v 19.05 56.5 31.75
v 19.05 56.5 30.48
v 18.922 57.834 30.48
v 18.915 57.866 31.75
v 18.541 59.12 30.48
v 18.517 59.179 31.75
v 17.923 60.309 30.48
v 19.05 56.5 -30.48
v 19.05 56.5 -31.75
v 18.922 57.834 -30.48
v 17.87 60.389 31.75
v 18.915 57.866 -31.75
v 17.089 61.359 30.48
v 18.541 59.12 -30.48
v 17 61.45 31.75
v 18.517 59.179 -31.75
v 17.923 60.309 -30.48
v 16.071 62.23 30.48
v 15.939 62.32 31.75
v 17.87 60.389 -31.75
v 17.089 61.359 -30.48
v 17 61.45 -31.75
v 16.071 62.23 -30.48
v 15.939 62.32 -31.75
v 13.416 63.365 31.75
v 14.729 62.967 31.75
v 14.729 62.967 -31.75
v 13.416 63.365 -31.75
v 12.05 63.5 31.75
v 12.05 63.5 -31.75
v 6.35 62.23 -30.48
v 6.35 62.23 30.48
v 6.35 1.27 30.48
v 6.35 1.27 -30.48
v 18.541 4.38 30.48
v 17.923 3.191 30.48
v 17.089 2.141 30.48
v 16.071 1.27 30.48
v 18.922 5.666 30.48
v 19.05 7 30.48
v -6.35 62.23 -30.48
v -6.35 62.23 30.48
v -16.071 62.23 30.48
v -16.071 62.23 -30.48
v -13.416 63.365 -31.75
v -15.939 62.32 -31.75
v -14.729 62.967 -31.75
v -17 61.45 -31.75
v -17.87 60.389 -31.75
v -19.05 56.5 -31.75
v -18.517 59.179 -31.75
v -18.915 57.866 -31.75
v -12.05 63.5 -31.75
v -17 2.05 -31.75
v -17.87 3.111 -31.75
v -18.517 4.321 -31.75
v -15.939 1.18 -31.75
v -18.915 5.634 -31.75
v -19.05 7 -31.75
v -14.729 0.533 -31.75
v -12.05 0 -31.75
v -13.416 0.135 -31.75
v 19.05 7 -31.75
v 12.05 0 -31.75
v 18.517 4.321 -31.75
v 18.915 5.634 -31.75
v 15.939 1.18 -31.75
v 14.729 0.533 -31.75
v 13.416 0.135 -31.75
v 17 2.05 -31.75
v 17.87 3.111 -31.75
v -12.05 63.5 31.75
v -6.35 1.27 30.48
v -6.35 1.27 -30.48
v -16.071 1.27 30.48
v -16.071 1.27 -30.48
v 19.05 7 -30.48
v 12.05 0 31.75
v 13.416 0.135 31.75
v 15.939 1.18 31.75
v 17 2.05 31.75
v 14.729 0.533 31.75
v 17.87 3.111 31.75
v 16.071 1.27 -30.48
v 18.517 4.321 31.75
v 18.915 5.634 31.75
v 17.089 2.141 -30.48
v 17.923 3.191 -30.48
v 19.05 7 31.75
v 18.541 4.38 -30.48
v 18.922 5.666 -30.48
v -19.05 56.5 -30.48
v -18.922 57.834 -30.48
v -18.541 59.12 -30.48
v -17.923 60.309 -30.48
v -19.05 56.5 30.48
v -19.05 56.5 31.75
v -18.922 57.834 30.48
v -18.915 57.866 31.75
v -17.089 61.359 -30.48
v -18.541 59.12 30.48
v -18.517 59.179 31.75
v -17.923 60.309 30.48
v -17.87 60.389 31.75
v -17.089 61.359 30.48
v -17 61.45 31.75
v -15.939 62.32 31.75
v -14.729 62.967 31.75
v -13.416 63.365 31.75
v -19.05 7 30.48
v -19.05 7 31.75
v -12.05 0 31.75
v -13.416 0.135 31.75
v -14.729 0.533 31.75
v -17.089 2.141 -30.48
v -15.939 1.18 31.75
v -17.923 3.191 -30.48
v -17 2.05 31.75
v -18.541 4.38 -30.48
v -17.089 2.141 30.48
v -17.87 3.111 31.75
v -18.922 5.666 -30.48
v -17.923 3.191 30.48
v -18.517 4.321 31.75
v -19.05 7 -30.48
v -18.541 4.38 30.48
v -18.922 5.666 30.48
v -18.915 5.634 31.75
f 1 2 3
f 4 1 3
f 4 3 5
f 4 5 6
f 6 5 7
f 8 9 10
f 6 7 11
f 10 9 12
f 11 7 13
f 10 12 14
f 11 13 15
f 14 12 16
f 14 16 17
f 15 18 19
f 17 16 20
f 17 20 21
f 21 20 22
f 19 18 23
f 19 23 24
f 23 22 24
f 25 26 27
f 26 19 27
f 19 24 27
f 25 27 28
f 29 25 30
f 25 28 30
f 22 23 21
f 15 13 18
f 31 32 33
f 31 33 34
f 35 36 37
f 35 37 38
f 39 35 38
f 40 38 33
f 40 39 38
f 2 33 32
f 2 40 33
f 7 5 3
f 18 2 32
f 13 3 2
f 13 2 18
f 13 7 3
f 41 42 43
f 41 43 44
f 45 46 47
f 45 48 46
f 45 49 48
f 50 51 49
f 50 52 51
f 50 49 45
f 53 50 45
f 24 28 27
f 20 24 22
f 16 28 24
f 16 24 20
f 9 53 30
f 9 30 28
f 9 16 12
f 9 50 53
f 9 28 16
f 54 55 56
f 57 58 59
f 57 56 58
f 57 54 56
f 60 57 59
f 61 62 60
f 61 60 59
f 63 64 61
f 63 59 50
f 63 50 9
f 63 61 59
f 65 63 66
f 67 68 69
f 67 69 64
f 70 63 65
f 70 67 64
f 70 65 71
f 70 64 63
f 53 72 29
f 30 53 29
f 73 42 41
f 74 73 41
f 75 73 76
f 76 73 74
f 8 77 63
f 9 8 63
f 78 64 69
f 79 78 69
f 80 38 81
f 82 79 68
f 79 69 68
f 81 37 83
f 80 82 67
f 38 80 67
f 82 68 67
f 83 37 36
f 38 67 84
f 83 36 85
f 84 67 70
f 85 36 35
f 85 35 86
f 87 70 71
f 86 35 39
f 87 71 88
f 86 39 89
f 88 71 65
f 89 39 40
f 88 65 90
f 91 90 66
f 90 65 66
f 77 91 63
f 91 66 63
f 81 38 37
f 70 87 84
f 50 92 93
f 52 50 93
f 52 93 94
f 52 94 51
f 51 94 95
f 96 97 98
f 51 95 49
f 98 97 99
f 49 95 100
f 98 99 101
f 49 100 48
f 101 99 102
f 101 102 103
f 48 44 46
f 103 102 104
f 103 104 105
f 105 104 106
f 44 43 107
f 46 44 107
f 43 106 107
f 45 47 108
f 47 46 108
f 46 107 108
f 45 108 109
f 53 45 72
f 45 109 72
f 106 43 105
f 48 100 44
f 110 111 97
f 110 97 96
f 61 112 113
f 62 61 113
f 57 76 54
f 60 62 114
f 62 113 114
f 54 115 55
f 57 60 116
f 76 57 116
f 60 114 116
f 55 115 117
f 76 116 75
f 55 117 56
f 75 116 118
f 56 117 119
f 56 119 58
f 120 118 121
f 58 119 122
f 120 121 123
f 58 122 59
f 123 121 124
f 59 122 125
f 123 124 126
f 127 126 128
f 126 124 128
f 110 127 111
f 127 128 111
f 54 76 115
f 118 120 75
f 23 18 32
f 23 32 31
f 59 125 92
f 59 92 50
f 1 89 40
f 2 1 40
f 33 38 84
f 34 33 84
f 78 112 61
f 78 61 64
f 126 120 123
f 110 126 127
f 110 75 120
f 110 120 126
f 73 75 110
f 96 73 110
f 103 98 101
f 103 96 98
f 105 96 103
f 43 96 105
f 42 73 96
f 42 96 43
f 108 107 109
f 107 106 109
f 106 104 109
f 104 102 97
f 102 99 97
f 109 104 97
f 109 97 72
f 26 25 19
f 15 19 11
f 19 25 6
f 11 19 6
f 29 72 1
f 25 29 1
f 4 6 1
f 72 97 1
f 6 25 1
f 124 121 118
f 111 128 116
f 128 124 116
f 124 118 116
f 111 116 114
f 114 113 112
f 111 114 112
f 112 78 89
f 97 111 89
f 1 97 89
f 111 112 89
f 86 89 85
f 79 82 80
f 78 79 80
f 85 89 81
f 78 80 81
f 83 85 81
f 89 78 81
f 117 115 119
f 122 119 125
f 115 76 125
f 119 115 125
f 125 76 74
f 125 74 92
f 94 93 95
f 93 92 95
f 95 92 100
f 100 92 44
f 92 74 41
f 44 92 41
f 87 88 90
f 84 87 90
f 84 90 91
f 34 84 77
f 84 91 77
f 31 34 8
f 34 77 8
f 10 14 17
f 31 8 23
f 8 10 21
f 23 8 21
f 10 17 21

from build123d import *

# Parameters (mm, degrees)
SKETCH1_W           = 38.1
SKETCH1_H           = 63.5
BOSS_EXTRUDE1_DEPTH = 63.5
SKETCH2_W           = 60.96
SKETCH2_H           = 60.96
CUT_EXTRUDE1_DEPTH  = 12.7
LPATTERN1_COUNT     = 2
LPATTERN1_PITCH     = 25.4
FILLET1_R           = 7
FILLET2_R           = 7


with BuildPart() as part:
    # Sketch1 → Boss-Extrude1 (new body)
    with BuildSketch(Plane(origin=(0, 0, 0), x_dir=(1, 0, 0), z_dir=(0, 1, 0))):
        Rectangle(SKETCH1_W, SKETCH1_H)
    extrude(amount=BOSS_EXTRUDE1_DEPTH)

    # Sketch2 → Cut-Extrude1 (cut)
    with BuildSketch(Plane(origin=(19.05, 0, 0), x_dir=(0, 0, -1), z_dir=(1, 0, 0))):
        with Locations((0, 31.75)):
            Rectangle(SKETCH2_W, SKETCH2_H)
    cut_extrude1 = extrude(amount=-CUT_EXTRUDE1_DEPTH, mode=Mode.SUBTRACT)

    # LPattern1: Cut-Extrude1 ×2
    with Locations(*[(-i * LPATTERN1_PITCH, 0, 0) for i in range(1, LPATTERN1_COUNT)]):
        add(cut_extrude1, mode=Mode.SUBTRACT)

    # Fillet1
    # the kernel refuses this fillet: 7 mm, written as the material it takes off along each edge
    with BuildSketch(Plane(origin=(19.05, 63.5, -49.25), x_dir=(0, -1, 0), z_dir=(0, 0, 1)), Plane(origin=(-19.05, 63.5, 49.25), x_dir=(0, -1, 0), z_dir=(0, 0, -1))) as fillet1_piece_1:
        with BuildLine():
            CenterArc((FILLET1_R, -FILLET1_R), FILLET1_R, 90, 90)
            Line((0, -FILLET1_R), (0, 0))
            Line((0, 0), (FILLET1_R, 0))
        make_face()
    extrude(amount=98.5, mode=Mode.SUBTRACT)

    # Fillet2
    # the kernel refuses this fillet: 7 mm, written as the material it takes off along each edge
    with BuildSketch(Plane(origin=(-19.05, 0, 49.25), x_dir=(1, 0, 0), z_dir=(0, 0, -1)), Plane(origin=(19.05, 0, -49.25), x_dir=(-1, 0, 0), z_dir=(0, 0, 1))) as fillet2_piece_1:
        with BuildLine():
            CenterArc((FILLET2_R, -FILLET2_R), FILLET2_R, 90, 90)
            Line((0, -FILLET2_R), (0, 0))
            Line((0, 0), (FILLET2_R, 0))
        make_face()
    extrude(amount=98.5, mode=Mode.SUBTRACT)


solid = part.part
